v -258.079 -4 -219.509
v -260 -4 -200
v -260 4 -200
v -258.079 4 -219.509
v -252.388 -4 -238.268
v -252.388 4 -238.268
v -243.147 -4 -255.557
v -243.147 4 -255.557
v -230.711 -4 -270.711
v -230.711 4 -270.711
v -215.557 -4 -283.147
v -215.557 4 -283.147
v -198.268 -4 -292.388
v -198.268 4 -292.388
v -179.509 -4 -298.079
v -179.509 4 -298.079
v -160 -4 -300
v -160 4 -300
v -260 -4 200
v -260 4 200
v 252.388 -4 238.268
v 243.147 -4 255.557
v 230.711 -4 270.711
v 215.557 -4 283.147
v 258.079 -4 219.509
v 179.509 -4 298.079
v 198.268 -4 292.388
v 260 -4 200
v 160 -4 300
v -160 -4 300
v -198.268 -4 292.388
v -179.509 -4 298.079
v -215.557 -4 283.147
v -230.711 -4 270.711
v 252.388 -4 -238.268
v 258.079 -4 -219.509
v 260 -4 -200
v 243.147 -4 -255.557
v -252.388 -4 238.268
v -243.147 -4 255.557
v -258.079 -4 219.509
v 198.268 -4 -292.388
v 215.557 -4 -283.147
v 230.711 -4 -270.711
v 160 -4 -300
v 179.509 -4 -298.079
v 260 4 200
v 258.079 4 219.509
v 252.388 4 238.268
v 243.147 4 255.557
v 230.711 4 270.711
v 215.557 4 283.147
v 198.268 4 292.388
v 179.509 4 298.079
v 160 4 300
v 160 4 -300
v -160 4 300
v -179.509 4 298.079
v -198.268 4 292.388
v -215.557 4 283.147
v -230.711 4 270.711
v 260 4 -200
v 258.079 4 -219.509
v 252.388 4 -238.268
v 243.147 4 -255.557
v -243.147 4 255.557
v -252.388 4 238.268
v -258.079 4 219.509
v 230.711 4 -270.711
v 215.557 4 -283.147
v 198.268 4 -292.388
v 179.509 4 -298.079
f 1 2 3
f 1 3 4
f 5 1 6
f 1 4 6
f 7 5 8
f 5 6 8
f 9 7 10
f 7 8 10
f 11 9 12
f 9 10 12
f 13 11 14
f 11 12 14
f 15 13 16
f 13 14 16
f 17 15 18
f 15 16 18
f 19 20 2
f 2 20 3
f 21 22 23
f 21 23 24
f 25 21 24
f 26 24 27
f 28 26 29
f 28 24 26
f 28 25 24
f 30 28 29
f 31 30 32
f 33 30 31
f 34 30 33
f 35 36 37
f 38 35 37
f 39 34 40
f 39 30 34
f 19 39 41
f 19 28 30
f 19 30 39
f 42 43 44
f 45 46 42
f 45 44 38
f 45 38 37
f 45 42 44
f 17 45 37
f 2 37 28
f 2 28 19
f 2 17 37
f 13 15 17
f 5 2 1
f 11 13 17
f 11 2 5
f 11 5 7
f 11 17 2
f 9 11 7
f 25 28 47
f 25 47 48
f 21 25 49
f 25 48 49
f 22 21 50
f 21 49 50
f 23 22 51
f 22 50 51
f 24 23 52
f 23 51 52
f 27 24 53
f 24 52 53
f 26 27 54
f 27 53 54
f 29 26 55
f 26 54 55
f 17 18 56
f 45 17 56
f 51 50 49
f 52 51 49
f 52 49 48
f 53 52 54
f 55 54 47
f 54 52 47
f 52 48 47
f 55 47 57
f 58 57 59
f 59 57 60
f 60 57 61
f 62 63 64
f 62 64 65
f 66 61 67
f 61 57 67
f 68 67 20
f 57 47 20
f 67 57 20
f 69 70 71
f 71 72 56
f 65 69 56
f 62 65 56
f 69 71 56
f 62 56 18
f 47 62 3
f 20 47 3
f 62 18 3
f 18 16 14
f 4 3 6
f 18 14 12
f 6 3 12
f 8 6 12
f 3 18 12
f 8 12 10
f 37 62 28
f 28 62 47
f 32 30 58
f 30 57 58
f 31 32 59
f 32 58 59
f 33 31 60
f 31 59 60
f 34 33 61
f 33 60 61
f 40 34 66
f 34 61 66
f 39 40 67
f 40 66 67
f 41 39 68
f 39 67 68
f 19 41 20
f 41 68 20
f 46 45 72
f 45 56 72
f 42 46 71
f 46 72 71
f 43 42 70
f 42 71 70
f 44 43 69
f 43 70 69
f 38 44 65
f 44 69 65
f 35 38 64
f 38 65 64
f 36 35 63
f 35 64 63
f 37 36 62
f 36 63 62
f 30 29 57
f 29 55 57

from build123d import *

# Parameters (mm, degrees)
CHAPAINFERIOR_DEPTH = 4


with BuildPart() as part:
    # Chapa inferior → ChapaInferior (new, symmetric)
    with BuildSketch(Plane(origin=(0, 0, 0), x_dir=(1, 0, 0), z_dir=(0, 1, 0))):
        with BuildLine():
            Line((-160, 300), (160, 300))
            ThreePointArc((160, 300), (230.710678119, 270.710678119), (260, 200))
            Line((260, 200), (260, -200))
            ThreePointArc((260, -200), (230.710678119, -270.710678119), (160, -300))
            Line((160, -300), (-160, -300))
            ThreePointArc((-160, -300), (-230.710678119, -270.710678119), (-260, -200))
            Line((-260, -200), (-260, 200))
            ThreePointArc((-260, 200), (-230.710678119, 270.710678119), (-160, 300))
        make_face()
    extrude(amount=CHAPAINFERIOR_DEPTH, both=True)


solid = part.part
